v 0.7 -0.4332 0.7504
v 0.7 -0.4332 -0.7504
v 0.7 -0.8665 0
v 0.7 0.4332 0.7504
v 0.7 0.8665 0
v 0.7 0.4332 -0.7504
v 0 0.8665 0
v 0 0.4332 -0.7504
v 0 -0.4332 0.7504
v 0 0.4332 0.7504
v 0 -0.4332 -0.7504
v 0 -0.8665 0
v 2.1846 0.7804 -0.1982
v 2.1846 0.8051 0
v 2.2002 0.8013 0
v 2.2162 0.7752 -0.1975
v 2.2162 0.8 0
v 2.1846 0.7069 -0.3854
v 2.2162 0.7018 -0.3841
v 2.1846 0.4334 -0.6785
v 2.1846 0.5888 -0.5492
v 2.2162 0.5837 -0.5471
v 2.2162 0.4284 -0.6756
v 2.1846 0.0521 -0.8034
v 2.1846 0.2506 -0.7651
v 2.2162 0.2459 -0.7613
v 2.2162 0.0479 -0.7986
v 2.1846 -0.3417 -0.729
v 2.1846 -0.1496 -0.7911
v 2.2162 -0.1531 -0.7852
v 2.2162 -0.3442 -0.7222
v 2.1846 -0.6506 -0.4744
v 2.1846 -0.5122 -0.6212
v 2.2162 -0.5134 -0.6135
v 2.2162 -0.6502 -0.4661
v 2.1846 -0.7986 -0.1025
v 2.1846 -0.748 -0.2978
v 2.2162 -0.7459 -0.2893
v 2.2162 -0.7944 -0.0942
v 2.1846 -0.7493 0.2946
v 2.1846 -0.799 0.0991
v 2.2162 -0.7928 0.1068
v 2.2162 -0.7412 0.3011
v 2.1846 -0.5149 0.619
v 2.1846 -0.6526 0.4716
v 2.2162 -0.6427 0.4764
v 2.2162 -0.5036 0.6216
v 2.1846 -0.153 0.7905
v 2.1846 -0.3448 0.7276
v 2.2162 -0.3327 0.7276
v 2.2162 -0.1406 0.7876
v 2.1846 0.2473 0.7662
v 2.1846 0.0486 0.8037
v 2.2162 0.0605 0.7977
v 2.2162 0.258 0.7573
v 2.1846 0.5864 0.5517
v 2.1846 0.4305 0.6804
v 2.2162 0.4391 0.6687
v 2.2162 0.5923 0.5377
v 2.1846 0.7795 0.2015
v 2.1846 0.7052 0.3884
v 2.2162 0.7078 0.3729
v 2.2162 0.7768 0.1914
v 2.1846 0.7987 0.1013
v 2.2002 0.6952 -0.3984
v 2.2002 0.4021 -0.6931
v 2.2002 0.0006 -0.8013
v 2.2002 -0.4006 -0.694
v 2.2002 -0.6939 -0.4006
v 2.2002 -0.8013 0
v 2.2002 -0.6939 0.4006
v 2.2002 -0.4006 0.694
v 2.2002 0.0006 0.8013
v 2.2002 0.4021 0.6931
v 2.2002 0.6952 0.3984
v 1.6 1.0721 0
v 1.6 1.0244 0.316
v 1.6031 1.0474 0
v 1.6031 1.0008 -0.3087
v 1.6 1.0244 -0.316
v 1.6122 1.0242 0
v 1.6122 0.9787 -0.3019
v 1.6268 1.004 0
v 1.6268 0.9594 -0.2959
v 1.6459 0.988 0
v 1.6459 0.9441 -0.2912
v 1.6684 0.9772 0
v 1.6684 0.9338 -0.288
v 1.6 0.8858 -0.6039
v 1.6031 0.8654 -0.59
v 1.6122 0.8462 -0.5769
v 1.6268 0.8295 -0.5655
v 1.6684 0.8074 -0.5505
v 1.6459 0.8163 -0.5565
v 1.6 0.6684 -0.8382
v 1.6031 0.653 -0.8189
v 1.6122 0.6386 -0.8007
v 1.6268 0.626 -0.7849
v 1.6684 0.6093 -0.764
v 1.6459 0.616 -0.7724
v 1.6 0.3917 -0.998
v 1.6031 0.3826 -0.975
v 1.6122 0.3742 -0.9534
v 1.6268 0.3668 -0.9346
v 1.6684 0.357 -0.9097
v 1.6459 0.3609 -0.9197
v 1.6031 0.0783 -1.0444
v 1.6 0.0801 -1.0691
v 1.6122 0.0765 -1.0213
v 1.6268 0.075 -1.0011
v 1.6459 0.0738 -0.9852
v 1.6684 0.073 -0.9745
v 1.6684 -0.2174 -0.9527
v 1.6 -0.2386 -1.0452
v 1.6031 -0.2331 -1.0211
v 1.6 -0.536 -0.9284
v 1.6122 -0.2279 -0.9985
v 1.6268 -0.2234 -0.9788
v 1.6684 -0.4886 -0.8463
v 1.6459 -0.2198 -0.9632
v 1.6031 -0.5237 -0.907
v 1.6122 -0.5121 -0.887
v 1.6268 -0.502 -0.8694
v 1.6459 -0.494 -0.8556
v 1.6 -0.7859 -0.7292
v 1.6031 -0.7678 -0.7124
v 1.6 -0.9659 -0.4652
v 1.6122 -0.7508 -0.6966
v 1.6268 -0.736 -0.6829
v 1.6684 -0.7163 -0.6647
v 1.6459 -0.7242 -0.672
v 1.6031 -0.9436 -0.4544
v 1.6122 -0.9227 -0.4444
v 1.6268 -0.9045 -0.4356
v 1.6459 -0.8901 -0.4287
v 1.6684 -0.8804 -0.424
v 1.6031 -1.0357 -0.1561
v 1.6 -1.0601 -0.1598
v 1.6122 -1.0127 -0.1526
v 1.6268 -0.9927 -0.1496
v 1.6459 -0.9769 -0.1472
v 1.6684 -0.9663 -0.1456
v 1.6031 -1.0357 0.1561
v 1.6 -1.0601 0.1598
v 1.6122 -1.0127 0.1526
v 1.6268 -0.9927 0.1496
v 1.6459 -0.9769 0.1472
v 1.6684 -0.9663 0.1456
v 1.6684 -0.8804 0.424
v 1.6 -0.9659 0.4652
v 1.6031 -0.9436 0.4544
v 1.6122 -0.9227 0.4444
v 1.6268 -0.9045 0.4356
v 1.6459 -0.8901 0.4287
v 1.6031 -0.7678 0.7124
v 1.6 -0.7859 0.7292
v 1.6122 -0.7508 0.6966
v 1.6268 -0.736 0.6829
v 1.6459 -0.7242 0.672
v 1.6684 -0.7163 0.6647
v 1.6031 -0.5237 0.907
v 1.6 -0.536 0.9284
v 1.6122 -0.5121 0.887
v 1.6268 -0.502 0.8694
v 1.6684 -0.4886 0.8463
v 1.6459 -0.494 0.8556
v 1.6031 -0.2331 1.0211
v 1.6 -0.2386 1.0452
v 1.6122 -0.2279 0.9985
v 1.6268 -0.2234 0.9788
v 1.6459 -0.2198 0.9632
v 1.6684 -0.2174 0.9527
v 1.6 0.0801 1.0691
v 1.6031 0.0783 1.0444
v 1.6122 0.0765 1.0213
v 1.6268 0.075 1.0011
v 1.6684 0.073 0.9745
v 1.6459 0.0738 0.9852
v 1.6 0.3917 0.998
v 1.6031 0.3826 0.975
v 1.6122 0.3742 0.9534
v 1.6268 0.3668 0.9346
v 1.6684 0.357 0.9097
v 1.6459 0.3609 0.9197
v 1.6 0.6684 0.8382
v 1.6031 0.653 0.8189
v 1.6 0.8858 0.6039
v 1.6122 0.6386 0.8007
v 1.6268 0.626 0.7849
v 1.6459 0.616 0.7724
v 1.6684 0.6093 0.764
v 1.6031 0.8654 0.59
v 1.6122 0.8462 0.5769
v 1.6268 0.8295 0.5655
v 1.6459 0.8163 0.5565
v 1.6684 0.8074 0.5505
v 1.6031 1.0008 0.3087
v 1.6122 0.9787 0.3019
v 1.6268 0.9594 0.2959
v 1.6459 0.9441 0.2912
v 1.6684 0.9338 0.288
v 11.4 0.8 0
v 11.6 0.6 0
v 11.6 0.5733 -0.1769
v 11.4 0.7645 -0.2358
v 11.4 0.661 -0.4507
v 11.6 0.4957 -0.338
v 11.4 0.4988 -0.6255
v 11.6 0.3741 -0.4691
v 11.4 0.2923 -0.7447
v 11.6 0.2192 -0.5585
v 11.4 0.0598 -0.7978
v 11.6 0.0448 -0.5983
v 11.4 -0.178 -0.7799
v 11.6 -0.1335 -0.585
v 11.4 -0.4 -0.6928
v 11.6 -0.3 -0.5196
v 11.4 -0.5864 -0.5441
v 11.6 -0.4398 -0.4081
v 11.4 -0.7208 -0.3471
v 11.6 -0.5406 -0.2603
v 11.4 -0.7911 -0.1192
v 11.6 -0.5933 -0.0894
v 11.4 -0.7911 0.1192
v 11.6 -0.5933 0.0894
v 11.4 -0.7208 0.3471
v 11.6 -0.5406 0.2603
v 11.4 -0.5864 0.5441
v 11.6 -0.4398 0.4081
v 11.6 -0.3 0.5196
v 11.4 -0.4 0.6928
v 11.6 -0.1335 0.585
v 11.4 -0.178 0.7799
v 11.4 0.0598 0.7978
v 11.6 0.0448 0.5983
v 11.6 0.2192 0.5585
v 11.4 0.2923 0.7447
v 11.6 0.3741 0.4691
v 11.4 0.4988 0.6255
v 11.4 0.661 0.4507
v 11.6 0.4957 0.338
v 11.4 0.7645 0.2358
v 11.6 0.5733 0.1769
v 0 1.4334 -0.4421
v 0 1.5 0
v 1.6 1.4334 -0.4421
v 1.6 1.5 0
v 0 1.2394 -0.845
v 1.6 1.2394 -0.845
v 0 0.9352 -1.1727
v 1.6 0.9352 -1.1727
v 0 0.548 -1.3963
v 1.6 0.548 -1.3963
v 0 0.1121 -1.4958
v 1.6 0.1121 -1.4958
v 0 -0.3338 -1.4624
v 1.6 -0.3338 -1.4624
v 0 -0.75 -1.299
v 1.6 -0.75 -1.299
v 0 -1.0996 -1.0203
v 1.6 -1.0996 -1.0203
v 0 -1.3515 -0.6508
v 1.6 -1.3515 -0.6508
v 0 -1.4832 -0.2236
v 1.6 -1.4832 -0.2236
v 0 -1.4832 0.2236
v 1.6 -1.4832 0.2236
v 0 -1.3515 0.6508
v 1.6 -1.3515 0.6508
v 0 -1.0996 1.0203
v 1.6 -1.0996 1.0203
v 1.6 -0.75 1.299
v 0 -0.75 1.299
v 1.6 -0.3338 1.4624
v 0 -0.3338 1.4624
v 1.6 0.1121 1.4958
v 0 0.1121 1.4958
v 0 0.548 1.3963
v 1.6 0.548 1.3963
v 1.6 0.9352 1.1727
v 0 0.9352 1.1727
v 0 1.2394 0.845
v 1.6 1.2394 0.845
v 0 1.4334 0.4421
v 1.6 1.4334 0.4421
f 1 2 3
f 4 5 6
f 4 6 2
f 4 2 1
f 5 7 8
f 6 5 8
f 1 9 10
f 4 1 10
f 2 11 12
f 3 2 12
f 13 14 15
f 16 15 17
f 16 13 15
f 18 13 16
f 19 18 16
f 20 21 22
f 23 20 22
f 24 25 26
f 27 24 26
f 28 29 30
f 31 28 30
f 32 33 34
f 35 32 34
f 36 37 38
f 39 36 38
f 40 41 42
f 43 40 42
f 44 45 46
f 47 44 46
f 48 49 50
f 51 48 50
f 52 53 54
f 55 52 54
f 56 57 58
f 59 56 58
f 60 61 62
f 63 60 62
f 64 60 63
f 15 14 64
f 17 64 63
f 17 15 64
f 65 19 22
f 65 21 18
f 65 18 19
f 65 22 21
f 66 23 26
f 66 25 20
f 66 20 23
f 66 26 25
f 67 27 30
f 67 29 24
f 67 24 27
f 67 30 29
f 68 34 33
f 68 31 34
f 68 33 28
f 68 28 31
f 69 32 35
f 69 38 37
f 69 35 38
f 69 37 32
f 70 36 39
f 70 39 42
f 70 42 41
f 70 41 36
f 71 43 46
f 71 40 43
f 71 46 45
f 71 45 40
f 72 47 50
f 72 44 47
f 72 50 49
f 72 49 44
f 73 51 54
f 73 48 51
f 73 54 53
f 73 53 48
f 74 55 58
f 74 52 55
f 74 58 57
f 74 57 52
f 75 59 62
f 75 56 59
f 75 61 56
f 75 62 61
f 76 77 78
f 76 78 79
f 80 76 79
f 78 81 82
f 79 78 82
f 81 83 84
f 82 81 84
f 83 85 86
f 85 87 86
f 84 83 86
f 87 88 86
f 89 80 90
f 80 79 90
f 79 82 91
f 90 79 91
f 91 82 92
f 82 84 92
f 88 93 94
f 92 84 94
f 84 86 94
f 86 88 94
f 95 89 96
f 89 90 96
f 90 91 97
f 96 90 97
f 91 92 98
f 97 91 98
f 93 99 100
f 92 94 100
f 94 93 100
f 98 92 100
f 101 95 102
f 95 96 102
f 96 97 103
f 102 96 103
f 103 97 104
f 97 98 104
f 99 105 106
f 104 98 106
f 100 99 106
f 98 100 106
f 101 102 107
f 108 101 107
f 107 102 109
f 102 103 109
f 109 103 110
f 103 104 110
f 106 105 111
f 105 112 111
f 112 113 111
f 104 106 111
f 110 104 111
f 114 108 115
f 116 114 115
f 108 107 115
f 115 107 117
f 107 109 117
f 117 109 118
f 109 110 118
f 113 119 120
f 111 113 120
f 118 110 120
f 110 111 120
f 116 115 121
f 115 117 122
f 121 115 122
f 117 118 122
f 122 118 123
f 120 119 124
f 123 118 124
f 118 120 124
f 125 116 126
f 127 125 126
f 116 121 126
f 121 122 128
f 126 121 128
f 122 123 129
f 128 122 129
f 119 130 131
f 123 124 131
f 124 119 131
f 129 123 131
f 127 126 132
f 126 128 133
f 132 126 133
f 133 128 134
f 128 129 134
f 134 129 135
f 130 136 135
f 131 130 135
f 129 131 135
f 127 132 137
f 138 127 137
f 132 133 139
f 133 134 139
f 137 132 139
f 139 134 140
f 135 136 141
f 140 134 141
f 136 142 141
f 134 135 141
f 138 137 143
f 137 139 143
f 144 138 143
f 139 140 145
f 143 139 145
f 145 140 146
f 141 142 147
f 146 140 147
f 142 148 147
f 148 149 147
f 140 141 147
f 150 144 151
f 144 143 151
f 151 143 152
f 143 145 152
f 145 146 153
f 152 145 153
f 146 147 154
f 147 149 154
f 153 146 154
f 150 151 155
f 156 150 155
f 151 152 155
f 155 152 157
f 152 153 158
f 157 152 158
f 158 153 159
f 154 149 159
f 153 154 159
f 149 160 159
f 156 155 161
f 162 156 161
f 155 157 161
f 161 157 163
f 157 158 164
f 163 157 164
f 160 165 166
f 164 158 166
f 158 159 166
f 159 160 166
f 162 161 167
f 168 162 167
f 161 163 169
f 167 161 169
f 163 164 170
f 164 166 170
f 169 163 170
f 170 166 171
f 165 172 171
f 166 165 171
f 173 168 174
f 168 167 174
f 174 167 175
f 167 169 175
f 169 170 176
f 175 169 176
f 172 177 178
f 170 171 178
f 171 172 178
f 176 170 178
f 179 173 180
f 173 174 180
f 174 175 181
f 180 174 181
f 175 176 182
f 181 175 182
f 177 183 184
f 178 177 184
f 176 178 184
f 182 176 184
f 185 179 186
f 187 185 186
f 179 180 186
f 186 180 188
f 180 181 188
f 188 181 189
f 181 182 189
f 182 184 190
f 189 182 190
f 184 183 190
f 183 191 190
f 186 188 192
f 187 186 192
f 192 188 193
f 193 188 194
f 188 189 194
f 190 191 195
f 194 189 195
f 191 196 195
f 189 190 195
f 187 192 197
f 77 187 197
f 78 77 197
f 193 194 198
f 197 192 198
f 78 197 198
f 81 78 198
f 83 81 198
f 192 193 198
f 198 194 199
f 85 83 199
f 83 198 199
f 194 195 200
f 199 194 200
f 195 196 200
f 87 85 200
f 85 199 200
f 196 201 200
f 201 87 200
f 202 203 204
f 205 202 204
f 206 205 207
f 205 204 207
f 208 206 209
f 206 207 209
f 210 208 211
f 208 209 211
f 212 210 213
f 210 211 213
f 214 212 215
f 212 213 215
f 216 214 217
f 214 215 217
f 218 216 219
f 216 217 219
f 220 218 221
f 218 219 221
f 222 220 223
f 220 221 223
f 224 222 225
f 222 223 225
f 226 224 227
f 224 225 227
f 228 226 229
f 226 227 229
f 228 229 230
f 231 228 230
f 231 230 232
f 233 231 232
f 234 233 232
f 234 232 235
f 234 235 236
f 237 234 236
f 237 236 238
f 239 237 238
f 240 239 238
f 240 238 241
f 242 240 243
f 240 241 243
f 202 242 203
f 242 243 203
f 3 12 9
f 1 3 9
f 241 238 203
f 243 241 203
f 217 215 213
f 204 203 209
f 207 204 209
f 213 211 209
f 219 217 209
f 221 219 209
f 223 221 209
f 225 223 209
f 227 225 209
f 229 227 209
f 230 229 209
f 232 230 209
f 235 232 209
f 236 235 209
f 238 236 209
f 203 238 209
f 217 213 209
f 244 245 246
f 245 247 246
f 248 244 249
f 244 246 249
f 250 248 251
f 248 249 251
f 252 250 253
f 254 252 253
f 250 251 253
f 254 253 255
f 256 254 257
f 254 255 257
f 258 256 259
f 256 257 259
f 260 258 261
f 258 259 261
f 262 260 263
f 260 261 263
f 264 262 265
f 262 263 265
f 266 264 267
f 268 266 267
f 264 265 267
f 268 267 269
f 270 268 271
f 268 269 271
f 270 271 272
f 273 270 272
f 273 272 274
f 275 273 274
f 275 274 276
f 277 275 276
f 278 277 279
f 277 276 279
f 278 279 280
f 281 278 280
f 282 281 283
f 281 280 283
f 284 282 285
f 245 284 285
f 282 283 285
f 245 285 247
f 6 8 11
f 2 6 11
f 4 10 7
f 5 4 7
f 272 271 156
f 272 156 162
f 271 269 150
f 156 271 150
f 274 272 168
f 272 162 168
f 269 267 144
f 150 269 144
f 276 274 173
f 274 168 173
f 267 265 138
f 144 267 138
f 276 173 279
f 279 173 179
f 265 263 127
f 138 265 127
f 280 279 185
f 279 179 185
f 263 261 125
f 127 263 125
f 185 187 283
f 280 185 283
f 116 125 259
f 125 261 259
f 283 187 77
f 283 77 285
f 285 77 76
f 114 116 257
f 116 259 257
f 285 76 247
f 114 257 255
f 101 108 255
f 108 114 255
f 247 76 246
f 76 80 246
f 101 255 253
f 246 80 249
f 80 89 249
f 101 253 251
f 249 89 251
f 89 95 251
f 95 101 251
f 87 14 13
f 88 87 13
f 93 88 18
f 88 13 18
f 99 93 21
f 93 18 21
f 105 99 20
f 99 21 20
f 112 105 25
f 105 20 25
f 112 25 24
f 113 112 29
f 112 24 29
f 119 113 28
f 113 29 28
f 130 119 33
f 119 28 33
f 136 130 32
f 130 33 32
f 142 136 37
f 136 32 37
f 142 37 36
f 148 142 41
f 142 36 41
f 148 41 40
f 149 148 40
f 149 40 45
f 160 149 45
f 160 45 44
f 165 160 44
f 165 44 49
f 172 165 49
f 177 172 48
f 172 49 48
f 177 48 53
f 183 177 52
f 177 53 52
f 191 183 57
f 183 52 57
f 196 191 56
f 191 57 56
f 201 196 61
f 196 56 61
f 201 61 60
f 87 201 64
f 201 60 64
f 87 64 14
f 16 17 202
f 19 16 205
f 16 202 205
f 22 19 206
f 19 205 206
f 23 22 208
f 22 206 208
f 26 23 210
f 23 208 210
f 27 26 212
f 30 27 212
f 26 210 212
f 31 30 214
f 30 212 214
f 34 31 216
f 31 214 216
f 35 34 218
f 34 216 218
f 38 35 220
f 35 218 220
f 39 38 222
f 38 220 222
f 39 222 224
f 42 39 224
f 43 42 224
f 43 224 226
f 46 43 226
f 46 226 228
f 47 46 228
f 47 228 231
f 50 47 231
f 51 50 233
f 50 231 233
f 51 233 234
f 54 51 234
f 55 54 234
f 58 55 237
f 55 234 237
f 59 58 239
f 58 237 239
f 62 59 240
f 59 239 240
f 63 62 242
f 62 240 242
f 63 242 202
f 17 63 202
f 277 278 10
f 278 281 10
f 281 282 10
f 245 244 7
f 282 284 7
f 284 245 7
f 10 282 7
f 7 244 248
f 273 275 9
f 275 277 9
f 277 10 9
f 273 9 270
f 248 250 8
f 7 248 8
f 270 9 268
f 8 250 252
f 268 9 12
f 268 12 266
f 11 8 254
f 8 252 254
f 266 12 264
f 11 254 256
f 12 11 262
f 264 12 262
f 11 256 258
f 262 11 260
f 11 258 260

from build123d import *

# Parameters (mm, degrees)
FILLET_1_R          = 0.1
CHAMFER_1_SIZE      = 0.2
CUT_EXTRUDE_1_DEPTH = 0.7


with BuildPart() as part:
    # Эскиз1 → Повернуть1 (revolve)
    with BuildSketch(Plane.XY):
        Polygon((0, 0), (0, 1.5), (1.6, 1.5), (1.6, 1), (2.2, 0.8), (11.6, 0.8), (11.6, 0), align=None)
    revolve(axis=Axis((0, 0, 0), (-1, 0, 0)))

    # Скругление1
    fillet_1_edges = [part.edges().sort_by_distance(p)[0] for p in [
        (2.2, -0.8, 0),
        (1.6, -1, 0),
    ]]
    fillet(fillet_1_edges, radius=FILLET_1_R)

    # Фаска1
    chamfer_1_edges = [part.edges().sort_by_distance(p)[0] for p in [
        (11.6, -0.8, 0),
    ]]
    chamfer(chamfer_1_edges, length=CHAMFER_1_SIZE)

    # Эскиз2 → Вырез-Вытянуть1 (cut)
    with BuildSketch(Plane.ZY):
        Polygon((0, 0.8665), (-0.750411012, 0.43325), (-0.750411012, -0.43325), (0, -0.8665), (0.750411012, -0.43325), (0.750411012, 0.43325), align=None)
    extrude(amount=-CUT_EXTRUDE_1_DEPTH, mode=Mode.SUBTRACT)


solid = part.part
